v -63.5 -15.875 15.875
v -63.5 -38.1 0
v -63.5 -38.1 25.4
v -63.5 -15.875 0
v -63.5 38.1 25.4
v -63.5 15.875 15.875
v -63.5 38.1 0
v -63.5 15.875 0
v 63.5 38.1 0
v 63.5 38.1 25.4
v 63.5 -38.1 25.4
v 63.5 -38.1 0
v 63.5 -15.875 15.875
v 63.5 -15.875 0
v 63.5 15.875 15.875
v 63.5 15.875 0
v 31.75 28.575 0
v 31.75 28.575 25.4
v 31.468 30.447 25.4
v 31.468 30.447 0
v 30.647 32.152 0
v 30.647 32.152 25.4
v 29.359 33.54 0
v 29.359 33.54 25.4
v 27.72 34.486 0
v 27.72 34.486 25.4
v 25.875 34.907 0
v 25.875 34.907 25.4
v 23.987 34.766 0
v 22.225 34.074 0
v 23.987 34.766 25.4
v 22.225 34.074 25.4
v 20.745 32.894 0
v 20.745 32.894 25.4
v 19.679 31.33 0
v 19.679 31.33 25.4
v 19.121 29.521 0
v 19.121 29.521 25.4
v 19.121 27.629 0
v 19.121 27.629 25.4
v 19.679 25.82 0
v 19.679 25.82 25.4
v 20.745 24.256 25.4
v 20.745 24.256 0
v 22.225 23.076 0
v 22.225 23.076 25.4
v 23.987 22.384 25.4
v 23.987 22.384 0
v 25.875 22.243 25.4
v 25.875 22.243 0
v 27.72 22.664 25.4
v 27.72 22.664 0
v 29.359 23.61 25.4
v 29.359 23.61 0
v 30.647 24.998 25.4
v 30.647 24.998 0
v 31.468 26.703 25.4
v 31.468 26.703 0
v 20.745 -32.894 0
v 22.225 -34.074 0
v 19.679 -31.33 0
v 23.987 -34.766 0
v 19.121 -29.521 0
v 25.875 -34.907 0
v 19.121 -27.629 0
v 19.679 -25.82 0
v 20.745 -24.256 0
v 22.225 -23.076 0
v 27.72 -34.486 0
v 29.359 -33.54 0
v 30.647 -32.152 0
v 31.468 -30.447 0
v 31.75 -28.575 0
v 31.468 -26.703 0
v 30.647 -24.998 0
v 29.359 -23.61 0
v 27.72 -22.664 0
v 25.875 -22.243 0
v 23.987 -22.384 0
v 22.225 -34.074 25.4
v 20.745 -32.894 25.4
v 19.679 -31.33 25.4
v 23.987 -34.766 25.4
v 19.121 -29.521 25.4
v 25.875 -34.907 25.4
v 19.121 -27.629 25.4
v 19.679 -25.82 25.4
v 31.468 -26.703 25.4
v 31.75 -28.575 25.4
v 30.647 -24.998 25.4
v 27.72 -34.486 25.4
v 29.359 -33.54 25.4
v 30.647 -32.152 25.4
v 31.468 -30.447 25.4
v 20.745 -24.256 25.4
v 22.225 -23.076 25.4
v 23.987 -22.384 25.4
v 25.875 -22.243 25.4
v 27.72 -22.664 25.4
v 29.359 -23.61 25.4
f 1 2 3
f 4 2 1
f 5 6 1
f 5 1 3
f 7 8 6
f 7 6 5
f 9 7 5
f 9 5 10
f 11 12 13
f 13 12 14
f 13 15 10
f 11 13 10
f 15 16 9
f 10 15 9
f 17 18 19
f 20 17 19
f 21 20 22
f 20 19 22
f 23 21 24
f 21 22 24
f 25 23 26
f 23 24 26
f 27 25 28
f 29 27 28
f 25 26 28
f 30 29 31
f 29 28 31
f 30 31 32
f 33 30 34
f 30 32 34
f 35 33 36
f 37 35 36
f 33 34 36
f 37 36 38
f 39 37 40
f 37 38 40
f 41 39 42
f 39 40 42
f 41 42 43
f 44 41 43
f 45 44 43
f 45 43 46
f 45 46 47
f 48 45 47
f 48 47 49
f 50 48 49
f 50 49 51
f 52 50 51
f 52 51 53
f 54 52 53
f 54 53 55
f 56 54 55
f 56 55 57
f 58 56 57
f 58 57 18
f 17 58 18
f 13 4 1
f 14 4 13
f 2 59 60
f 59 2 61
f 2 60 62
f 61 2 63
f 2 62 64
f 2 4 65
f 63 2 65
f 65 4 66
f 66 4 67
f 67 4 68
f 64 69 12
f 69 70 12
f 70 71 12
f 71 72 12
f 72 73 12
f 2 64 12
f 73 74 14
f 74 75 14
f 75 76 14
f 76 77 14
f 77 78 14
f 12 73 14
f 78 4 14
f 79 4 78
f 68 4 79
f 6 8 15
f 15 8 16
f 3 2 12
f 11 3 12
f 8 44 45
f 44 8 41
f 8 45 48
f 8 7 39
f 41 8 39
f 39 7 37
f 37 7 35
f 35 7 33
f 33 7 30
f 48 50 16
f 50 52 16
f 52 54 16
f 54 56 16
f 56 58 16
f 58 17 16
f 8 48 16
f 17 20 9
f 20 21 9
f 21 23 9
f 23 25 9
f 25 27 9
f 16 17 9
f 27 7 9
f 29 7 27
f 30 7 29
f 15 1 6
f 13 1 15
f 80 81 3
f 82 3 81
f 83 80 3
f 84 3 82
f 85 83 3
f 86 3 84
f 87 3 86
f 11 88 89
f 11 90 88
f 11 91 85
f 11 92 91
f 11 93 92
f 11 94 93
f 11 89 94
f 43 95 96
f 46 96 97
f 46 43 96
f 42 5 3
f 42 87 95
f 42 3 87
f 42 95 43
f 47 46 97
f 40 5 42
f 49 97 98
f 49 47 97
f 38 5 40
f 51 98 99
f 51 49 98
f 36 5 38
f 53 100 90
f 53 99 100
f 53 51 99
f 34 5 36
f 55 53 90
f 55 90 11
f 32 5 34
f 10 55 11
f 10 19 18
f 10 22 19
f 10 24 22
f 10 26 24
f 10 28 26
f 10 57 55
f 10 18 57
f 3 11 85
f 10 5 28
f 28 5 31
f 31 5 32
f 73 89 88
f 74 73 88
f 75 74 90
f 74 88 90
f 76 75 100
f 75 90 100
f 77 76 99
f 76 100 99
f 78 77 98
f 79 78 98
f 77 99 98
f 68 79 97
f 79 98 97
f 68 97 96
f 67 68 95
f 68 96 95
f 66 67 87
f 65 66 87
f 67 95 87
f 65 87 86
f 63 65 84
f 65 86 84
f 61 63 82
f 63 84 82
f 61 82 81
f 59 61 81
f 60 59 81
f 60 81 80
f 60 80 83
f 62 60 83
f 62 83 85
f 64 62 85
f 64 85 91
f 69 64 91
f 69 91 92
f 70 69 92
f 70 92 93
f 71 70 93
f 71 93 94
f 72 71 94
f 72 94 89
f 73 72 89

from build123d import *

# Parameters (mm, degrees)
F0_W     = 127
F0_H     = 76.2
F1_DEPTH = 25.4
F2_W     = 127
F2_H     = 31.75
F3_DEPTH = 15.875
F4_R     = 6.35
F5_DEPTH = 25.401


with BuildPart() as f1:
    # F0 (on Top) → F1 (new body)
    with BuildSketch(Plane.XY):
        Rectangle(F0_W, F0_H)
    extrude(amount=F1_DEPTH)

    # F2 (on face) → F3 (cut)
    with BuildSketch(Plane(origin=(0, 0, 0), x_dir=(1, 0, 0), z_dir=(0, 0, -1))):
        Rectangle(F2_W, F2_H)
    extrude(amount=-F3_DEPTH, mode=Mode.SUBTRACT)

    # F4 (on face) → F5 (cut, through all)
    with BuildSketch(Plane.XY.offset(25.4)):
        with Locations((25.4, 28.575)):
            Circle(F4_R)
        with Locations((25.4, -28.575)):
            Circle(F4_R)
    extrude(amount=-F5_DEPTH, mode=Mode.SUBTRACT)


solid = f1.part
